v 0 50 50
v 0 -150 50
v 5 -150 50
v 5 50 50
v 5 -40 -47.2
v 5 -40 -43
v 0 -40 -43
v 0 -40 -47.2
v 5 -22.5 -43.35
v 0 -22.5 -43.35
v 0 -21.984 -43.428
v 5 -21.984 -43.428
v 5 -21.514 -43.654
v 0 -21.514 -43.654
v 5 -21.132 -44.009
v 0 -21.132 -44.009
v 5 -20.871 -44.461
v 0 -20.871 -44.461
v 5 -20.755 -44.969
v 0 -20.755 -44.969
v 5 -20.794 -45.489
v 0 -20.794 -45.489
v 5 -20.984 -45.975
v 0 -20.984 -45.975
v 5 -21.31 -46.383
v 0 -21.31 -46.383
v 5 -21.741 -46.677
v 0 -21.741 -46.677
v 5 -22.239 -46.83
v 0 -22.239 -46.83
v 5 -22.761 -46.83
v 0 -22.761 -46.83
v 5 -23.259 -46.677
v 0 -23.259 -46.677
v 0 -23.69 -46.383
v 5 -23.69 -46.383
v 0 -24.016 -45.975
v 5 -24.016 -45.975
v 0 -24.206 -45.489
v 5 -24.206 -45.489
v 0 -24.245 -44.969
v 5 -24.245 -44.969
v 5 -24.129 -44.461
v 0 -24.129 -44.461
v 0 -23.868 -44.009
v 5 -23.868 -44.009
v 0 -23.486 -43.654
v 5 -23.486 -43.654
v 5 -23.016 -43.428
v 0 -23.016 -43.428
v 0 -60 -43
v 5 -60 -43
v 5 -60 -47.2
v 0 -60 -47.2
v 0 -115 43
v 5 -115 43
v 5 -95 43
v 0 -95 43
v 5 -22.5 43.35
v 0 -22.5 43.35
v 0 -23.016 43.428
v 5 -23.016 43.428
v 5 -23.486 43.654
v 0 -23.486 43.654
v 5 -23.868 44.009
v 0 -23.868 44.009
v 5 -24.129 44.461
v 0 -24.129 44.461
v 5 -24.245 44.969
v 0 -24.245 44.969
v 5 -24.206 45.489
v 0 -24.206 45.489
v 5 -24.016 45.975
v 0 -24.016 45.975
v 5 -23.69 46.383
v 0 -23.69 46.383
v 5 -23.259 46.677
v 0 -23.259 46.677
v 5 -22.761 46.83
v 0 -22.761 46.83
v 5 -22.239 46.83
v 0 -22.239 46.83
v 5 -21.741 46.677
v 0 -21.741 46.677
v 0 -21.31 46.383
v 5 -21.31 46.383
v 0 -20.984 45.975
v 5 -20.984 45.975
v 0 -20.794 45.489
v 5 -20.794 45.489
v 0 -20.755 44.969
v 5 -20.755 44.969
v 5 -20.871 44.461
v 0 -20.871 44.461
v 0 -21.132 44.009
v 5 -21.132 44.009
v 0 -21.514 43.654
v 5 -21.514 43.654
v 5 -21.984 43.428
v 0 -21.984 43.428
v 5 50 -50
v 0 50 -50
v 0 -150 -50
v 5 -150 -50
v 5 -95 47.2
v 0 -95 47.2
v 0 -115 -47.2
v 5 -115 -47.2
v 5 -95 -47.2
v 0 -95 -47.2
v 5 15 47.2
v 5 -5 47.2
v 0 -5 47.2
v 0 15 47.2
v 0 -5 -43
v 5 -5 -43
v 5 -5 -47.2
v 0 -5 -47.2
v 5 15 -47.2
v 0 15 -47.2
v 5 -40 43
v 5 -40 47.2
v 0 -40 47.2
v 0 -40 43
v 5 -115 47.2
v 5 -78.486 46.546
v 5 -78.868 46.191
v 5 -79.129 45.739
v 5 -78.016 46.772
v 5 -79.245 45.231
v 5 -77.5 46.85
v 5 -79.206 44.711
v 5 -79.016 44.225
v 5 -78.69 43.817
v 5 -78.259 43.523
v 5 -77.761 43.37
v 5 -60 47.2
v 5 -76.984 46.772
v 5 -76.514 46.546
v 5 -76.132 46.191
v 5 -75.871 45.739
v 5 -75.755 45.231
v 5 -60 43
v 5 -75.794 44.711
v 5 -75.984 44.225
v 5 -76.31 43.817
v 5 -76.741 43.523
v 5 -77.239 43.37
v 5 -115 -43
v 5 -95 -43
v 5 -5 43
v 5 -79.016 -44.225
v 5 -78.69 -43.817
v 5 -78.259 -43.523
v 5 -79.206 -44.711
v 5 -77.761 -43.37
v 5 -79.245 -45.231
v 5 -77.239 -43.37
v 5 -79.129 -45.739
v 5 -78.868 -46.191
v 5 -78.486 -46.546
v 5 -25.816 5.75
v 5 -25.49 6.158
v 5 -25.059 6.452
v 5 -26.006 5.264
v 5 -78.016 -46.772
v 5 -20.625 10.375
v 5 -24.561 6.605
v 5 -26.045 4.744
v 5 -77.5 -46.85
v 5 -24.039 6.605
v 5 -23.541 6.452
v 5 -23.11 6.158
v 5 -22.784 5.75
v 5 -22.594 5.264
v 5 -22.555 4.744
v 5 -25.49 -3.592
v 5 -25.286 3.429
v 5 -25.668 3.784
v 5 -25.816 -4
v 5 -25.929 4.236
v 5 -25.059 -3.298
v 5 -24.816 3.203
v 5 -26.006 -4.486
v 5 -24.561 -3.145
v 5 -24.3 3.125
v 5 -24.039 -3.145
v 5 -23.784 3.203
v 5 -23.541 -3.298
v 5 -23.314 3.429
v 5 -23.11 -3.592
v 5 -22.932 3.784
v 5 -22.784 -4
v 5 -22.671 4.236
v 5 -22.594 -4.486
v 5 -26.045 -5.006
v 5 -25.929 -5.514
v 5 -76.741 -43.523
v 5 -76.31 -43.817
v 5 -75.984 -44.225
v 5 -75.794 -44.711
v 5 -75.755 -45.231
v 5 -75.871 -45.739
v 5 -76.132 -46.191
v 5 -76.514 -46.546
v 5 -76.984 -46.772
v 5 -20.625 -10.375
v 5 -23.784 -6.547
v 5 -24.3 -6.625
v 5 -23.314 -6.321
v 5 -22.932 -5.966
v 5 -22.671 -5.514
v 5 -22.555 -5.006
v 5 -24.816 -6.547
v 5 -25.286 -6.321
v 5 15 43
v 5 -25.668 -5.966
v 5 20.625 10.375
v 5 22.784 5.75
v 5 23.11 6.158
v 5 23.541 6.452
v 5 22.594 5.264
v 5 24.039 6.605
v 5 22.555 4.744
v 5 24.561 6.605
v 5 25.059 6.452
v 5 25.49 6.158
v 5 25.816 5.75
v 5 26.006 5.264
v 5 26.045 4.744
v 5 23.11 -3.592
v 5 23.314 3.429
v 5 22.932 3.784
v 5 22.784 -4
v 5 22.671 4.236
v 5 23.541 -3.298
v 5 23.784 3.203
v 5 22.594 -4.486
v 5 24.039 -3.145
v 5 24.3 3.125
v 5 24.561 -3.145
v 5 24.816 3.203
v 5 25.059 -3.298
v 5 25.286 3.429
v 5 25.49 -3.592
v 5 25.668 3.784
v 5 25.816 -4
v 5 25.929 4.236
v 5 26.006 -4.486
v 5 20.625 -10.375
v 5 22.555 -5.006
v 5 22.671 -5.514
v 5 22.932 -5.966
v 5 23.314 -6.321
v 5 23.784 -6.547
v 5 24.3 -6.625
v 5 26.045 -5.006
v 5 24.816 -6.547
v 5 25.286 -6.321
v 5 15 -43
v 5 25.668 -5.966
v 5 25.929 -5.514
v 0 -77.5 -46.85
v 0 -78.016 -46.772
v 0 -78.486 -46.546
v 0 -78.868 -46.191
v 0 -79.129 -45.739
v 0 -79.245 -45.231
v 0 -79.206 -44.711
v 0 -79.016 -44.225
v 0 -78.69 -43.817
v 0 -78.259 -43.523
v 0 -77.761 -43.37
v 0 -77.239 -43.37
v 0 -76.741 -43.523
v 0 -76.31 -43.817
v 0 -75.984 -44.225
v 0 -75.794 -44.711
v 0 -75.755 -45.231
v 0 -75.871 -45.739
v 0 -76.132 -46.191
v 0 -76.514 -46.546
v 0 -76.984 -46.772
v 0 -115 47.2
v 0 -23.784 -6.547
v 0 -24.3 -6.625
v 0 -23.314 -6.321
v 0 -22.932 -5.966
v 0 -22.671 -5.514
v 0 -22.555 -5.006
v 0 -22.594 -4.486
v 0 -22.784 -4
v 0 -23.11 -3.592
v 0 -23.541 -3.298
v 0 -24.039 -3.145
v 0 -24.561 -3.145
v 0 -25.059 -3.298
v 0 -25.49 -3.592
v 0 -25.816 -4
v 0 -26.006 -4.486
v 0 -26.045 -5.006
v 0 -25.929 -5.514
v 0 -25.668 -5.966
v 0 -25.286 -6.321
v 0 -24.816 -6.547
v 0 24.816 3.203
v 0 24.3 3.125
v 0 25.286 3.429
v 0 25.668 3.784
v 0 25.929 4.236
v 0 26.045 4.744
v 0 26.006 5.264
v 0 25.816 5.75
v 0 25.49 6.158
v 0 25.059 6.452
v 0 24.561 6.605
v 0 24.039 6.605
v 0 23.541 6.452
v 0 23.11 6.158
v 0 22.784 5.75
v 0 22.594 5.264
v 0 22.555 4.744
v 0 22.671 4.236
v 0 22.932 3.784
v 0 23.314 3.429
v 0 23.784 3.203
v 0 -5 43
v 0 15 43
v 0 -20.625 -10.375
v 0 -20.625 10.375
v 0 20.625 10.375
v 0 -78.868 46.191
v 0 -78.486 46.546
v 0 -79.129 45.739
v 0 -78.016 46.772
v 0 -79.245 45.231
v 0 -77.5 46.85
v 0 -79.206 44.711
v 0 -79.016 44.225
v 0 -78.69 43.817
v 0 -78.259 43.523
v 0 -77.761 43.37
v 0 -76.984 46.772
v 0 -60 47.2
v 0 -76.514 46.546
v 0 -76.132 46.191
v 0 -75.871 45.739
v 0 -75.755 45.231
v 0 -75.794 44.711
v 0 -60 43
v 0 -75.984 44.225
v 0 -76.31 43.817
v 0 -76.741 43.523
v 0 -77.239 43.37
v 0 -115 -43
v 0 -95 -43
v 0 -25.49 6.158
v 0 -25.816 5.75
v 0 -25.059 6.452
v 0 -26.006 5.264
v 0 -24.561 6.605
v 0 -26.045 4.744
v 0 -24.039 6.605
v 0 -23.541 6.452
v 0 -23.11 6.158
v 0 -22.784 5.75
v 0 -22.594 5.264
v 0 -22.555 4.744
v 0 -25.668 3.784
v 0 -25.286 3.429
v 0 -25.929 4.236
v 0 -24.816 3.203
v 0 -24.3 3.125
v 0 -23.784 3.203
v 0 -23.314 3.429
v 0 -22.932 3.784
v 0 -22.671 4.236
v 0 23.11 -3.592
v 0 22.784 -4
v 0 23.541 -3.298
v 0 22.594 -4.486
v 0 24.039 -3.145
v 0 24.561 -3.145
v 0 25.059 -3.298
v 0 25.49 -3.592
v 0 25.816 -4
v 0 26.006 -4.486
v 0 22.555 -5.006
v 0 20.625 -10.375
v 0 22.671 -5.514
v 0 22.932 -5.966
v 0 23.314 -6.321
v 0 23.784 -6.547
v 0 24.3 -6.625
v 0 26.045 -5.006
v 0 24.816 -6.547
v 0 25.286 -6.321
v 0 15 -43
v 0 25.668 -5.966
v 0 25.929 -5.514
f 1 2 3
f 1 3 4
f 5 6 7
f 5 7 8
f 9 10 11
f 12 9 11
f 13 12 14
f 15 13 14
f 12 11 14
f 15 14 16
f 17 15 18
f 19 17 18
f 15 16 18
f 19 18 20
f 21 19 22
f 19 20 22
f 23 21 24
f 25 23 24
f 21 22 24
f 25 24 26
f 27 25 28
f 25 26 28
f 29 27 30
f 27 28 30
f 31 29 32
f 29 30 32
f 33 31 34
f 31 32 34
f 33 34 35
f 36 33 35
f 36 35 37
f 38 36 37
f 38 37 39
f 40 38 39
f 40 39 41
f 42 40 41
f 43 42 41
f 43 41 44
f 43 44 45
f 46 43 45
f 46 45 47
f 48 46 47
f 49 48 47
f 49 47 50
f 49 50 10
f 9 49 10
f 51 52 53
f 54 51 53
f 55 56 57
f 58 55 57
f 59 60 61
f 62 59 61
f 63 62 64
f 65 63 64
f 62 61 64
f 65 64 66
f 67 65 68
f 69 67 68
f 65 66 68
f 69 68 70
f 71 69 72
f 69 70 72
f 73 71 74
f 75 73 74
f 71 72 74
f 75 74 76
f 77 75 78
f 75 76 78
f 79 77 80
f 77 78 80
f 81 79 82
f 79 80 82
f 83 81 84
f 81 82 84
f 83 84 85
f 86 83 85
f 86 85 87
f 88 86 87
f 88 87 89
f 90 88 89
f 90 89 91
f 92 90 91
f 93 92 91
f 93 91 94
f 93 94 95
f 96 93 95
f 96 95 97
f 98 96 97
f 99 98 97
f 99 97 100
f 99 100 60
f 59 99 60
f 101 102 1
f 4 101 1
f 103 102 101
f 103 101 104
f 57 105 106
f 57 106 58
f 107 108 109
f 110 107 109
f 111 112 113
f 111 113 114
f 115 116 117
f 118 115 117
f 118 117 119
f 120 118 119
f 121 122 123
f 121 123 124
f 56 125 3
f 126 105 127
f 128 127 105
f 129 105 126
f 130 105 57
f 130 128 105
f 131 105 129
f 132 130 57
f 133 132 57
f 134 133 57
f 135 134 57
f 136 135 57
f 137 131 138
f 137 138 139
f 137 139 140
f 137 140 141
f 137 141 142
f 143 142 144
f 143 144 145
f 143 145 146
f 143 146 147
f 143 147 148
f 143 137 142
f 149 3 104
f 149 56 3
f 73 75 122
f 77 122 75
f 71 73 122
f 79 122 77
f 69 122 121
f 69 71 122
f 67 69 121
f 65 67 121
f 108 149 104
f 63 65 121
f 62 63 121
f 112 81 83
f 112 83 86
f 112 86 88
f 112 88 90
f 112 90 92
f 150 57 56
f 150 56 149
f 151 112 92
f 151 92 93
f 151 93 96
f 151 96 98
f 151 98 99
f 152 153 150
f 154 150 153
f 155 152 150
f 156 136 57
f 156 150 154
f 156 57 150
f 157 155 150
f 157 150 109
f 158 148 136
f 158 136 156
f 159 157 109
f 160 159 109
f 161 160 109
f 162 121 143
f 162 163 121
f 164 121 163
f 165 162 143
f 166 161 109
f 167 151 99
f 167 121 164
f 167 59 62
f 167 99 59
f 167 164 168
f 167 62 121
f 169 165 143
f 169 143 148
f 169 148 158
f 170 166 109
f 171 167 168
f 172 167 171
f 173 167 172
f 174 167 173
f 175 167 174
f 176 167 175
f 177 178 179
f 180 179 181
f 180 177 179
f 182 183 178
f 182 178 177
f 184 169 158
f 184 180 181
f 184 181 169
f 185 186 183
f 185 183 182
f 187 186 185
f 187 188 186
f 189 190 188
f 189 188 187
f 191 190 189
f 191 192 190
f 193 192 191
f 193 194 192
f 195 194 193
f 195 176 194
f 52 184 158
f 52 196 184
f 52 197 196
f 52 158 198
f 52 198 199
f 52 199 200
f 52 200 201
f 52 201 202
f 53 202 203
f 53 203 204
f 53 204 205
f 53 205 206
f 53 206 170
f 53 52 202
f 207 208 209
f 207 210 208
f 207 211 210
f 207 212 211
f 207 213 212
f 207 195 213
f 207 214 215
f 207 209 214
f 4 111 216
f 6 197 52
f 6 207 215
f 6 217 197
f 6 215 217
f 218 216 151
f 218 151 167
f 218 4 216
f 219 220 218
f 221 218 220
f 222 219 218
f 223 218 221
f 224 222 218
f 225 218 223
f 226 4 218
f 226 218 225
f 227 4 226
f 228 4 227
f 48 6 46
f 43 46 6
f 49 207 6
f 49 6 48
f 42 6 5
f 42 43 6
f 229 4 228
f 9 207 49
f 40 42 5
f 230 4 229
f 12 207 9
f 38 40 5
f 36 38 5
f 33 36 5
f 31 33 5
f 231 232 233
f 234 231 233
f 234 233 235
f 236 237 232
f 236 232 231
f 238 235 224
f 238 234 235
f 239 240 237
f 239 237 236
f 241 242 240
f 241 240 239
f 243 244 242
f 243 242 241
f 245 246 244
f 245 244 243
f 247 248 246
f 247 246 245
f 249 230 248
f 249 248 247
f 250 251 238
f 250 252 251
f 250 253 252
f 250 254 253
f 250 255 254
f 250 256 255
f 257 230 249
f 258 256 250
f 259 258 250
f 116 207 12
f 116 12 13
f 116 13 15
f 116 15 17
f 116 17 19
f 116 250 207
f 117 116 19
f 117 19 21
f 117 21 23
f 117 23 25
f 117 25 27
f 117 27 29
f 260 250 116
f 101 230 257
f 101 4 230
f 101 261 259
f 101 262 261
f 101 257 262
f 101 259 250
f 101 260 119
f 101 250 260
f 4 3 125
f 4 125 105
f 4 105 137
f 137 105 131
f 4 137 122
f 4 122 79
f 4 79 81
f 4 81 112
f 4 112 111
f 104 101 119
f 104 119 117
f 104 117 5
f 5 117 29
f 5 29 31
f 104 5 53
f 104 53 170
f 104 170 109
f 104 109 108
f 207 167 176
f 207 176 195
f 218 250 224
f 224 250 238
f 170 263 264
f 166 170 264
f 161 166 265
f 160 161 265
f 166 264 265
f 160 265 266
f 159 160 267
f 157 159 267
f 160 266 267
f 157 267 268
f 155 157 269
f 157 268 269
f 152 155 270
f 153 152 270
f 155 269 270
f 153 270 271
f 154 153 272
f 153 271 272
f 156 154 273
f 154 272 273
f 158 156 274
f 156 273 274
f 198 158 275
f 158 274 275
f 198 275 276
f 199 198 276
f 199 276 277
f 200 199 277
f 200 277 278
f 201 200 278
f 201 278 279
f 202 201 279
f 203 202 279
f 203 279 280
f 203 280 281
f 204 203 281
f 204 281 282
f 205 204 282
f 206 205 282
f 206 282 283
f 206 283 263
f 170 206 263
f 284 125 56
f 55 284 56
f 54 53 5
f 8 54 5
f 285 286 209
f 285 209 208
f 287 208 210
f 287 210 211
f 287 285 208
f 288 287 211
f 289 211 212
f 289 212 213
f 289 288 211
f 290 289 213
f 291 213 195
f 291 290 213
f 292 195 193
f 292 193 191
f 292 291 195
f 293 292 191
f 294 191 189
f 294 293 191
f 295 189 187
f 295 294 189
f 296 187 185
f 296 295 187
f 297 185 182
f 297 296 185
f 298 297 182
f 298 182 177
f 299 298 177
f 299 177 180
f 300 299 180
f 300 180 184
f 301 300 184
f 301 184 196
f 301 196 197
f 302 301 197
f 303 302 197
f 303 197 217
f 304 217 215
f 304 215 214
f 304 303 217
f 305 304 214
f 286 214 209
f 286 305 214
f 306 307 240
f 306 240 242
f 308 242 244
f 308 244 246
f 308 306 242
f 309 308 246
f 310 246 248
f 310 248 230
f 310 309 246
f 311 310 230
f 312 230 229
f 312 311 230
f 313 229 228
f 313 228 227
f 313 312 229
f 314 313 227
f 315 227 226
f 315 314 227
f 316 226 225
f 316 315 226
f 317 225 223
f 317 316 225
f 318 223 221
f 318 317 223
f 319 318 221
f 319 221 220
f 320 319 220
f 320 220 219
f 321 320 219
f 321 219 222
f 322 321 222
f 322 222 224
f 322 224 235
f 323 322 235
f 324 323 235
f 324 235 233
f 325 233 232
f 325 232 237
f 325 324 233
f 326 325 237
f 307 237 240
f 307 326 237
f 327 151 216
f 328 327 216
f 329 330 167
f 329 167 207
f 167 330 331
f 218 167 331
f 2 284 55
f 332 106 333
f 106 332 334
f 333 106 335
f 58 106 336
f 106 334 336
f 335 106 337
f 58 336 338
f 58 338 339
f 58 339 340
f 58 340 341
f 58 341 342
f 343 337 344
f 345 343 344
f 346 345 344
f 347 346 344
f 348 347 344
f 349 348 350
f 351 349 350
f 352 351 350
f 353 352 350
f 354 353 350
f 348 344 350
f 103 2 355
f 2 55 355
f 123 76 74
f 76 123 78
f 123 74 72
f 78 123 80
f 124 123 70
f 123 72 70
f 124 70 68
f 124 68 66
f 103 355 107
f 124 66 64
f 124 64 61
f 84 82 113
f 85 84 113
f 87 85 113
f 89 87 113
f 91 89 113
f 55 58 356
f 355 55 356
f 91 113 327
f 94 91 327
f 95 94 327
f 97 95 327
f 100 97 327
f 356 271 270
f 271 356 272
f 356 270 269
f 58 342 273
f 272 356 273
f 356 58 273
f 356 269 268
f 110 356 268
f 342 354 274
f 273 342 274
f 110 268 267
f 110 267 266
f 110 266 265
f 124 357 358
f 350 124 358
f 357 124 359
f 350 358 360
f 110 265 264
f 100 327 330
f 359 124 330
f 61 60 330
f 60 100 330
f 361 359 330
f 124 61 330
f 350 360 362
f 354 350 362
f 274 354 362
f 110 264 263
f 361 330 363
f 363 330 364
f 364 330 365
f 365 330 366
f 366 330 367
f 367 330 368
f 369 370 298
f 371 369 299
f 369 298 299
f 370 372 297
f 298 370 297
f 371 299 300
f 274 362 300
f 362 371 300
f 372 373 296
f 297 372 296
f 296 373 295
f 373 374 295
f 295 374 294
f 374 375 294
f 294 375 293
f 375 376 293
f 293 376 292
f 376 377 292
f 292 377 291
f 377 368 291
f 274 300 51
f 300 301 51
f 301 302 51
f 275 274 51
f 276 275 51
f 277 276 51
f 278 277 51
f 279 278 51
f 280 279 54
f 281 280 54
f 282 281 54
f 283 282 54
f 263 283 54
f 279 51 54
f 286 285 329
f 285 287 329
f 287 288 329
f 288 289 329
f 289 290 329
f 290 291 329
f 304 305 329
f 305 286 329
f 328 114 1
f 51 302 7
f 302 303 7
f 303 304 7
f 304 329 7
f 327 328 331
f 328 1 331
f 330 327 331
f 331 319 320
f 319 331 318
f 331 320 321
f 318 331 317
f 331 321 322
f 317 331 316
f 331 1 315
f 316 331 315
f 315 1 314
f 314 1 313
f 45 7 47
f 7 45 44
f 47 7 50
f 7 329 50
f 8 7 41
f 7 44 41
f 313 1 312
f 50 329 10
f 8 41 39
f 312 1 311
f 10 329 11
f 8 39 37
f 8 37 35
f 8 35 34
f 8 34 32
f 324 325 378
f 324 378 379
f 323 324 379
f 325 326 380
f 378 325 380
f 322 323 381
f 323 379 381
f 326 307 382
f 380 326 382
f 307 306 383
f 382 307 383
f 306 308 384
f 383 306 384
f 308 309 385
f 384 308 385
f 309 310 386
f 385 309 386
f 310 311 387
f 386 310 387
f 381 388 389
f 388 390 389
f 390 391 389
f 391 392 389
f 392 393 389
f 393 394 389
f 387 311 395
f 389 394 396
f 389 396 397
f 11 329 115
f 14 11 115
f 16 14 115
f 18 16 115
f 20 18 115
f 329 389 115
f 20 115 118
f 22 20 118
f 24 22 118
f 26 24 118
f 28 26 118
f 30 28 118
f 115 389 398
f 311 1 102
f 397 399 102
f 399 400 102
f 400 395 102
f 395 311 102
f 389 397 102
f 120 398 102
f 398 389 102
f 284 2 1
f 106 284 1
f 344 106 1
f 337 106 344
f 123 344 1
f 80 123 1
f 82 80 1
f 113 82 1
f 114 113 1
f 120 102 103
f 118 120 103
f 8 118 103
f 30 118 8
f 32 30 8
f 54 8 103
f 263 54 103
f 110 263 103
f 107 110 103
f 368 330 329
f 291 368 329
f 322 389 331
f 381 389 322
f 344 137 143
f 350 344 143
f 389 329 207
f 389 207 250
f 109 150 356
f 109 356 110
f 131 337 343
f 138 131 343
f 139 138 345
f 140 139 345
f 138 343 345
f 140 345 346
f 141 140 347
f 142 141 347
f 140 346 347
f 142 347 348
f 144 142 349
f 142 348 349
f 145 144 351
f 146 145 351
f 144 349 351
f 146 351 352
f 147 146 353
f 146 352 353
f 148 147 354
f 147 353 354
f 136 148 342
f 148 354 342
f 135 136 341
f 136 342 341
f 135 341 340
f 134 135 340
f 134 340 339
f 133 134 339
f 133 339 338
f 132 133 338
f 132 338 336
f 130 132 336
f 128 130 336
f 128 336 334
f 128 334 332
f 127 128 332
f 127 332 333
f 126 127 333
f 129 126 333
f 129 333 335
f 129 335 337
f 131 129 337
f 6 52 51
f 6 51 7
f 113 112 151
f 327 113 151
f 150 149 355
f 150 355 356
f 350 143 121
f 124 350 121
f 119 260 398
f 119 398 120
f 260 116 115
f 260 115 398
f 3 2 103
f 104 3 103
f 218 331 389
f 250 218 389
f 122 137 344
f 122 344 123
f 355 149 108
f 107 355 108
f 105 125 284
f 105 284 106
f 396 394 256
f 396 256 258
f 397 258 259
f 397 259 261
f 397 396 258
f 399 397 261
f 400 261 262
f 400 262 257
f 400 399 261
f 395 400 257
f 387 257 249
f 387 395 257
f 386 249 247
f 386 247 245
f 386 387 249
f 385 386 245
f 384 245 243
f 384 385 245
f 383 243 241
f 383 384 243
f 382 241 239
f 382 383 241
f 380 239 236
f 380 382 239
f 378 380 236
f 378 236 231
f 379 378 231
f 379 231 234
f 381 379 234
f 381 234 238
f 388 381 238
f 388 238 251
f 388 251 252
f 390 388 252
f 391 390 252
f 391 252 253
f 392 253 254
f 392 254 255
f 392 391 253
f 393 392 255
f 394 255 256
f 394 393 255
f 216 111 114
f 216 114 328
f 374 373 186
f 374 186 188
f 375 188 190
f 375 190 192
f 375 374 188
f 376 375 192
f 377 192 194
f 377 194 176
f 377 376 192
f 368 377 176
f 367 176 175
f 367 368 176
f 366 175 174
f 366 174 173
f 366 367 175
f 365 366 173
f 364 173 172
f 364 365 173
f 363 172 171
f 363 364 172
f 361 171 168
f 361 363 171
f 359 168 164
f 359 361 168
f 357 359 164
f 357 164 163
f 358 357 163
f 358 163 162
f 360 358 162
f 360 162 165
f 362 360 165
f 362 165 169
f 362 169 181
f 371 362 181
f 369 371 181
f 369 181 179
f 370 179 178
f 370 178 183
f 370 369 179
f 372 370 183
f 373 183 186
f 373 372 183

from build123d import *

# Parameters (mm, degrees)
CUT_EXTRUDE1_START     = -5
CUT_EXTRUDE1_OUTLINE_R = 1.75
CUT_EXTRUDE1_OUTLINE_W = 20.75
CUT_EXTRUDE1_OUTLINE_H = 41.25
CUT_EXTRUDE1_DEPTH     = 5
BOSS_EXTRUDE1_START    = -5
BOSS_EXTRUDE1_DEPTH    = 5
SKETCH4_W              = 30
SKETCH4_H              = 60
BOSS_EXTRUDE2_DEPTH    = 5
CUT_EXTRUDE2_REACH     = 160.193
SKETCH5_W              = 4.2
SKETCH5_H              = 20
CUT_EXTRUDE3_REACH     = 160.193
SKETCH6_R              = 1.75


with BuildPart() as part:
    # Cut-Extrude1: read off the stored shape, not the designer's step
    # Cut-Extrude1 outline → Cut-Extrude1 (new body)
    with BuildSketch(Plane(origin=(5, 0, 0), x_dir=(0, 0, -1), z_dir=(1, 0, 0)).offset(CUT_EXTRUDE1_START)):
        with BuildLine():
            Line((-6.17, -30), (6.17, -30))
            ThreePointArc((6.17, -30), (12.413752878, -27.413752878), (15, -21.17))
            Line((15, -21.17), (15, 21.17))
            ThreePointArc((15, 21.17), (12.413752878, 27.413752878), (6.17, 30))
            Line((6.17, 30), (-6.17, 30))
            ThreePointArc((-6.17, 30), (-12.413752878, 27.413752878), (-15, 21.17))
            Line((-15, 21.17), (-15, -21.17))
            ThreePointArc((-15, -21.17), (-12.413752878, -27.413752878), (-6.17, -30))
        make_face()
        with Locations((-4.875, -24.3)):
            Circle(CUT_EXTRUDE1_OUTLINE_R, mode=Mode.SUBTRACT)
        with Locations((4.875, -24.3)):
            Circle(CUT_EXTRUDE1_OUTLINE_R, mode=Mode.SUBTRACT)
        with Locations((-4.875, 24.3)):
            Circle(CUT_EXTRUDE1_OUTLINE_R, mode=Mode.SUBTRACT)
        Rectangle(CUT_EXTRUDE1_OUTLINE_W, CUT_EXTRUDE1_OUTLINE_H, mode=Mode.SUBTRACT)
        with Locations((4.875, 24.3)):
            Circle(CUT_EXTRUDE1_OUTLINE_R, mode=Mode.SUBTRACT)
    extrude(amount=CUT_EXTRUDE1_DEPTH)

    # Sketch2 → Boss-Extrude1 (add)
    with BuildSketch(Plane(origin=(5, 0, 0), x_dir=(0, 0, -1), z_dir=(1, 0, 0)).offset(BOSS_EXTRUDE1_START)):
        with BuildLine():
            Line((10.375, -20.625), (6.17, -20.625))
            Line((6.17, -20.625), (6.17, -21.93080825))
            Line((6.17, -21.93080825), (7.268440243, -21.93080825))
            Line((7.268440243, -21.93080825), (7.268440243, -27.341819789))
            Line((7.268440243, -27.341819789), (6.17, -27.341819789))
            Line((6.17, -27.341819789), (6.17, -30))
            ThreePointArc((6.17, -30), (12.413752878, -27.413752878), (15, -21.17))
            Line((15, -21.17), (15, 21.17))
            ThreePointArc((15, 21.17), (12.413752878, 27.413752878), (6.17, 30))
            Line((6.17, 30), (6.17, 26.982507006))
            Line((6.17, 26.982507006), (7.710578553, 26.982507006))
            Line((7.710578553, 26.982507006), (7.710578553, 21.584637872))
            Line((7.710578553, 21.584637872), (6.17, 21.584637872))
            Line((6.17, 21.584637872), (6.17, 20.625))
            Line((6.17, 20.625), (10.375, 20.625))
            Line((10.375, 20.625), (10.375, -20.625))
        make_face()
        with BuildLine():
            Line((-8.472684232, -21.93080825), (-6.17, -21.93080825))
            Line((-6.17, -21.93080825), (-6.17, -20.625))
            Line((-6.17, -20.625), (-10.375, -20.625))
            Line((-10.375, -20.625), (-10.375, 20.625))
            Line((-10.375, 20.625), (-6.17, 20.625))
            Line((-6.17, 20.625), (-6.17, 21.584637872))
            Line((-6.17, 21.584637872), (-7.710578553, 21.584637872))
            Line((-7.710578553, 21.584637872), (-7.710578553, 26.982507006))
            Line((-7.710578553, 26.982507006), (-6.17, 26.982507006))
            Line((-6.17, 26.982507006), (-6.17, 30))
            ThreePointArc((-6.17, 30), (-12.413752878, 27.413752878), (-15, 21.17))
            Line((-15, 21.17), (-15, -21.17))
            ThreePointArc((-15, -21.17), (-12.413752878, -27.413752878), (-6.17, -30))
            Line((-6.17, -30), (-6.17, -27.341819789))
            Line((-6.17, -27.341819789), (-8.472684232, -27.341819789))
            Line((-8.472684232, -27.341819789), (-8.472684232, -21.93080825))
        make_face()
        with BuildLine():
            Line((-15, 30), (-15, 21.17))
            ThreePointArc((-15, 21.17), (-12.413752878, 27.413752878), (-6.17, 30))
            Line((-6.17, 30), (-15, 30))
        make_face()
        with BuildLine():
            Line((15, 30), (6.17, 30))
            ThreePointArc((6.17, 30), (12.413752878, 27.413752878), (15, 21.17))
            Line((15, 21.17), (15, 30))
        make_face()
        with BuildLine():
            ThreePointArc((15, -21.17), (12.413752878, -27.413752878), (6.17, -30))
            Line((6.17, -30), (15, -30))
            Line((15, -30), (15, -21.17))
        make_face()
        with BuildLine():
            Line((-15, -30), (-6.17, -30))
            ThreePointArc((-6.17, -30), (-12.413752878, -27.413752878), (-15, -21.17))
            Line((-15, -21.17), (-15, -30))
        make_face()
    extrude(amount=BOSS_EXTRUDE1_DEPTH)

    # Sketch4 → Boss-Extrude2 (add)
    with BuildSketch(Plane.ZY):
        Polygon((-50, 50), (50, 50), (50, -50), (50, -150), (-50, -150), (-50, -50), align=None)
        Rectangle(SKETCH4_W, SKETCH4_H, mode=Mode.SUBTRACT)
    extrude(amount=-BOSS_EXTRUDE2_DEPTH)

    # Sketch5 → Cut-Extrude2 (cut, up to next)
    with BuildSketch(Plane(origin=(5, 0, 0), x_dir=(0, 0, -1), z_dir=(1, 0, 0)), mode=Mode.PRIVATE) as cut_extrude2_sk1:
        with Locations((45.1, -105)):
            Rectangle(SKETCH5_W, SKETCH5_H)
    cut_extrude2_tool1 = extrude(cut_extrude2_sk1.sketch, amount=-CUT_EXTRUDE2_REACH, mode=Mode.PRIVATE) & part.part
    # Sketch5 → Cut-Extrude2 (cut, up to next)
    with BuildSketch(Plane(origin=(5, 0, 0), x_dir=(0, 0, -1), z_dir=(1, 0, 0)), mode=Mode.PRIVATE) as cut_extrude2_sk2:
        with Locations((45.1, -50)):
            Rectangle(SKETCH5_W, SKETCH5_H)
    cut_extrude2_tool2 = extrude(cut_extrude2_sk2.sketch, amount=-CUT_EXTRUDE2_REACH, mode=Mode.PRIVATE) & part.part
    # Sketch5 → Cut-Extrude2 (cut, up to next)
    with BuildSketch(Plane(origin=(5, 0, 0), x_dir=(0, 0, -1), z_dir=(1, 0, 0)), mode=Mode.PRIVATE) as cut_extrude2_sk3:
        with Locations((45.1, 5)):
            Rectangle(SKETCH5_W, SKETCH5_H)
    cut_extrude2_tool3 = extrude(cut_extrude2_sk3.sketch, amount=-CUT_EXTRUDE2_REACH, mode=Mode.PRIVATE) & part.part
    # Sketch5 → Cut-Extrude2 (cut, up to next)
    with BuildSketch(Plane(origin=(5, 0, 0), x_dir=(0, 0, -1), z_dir=(1, 0, 0)), mode=Mode.PRIVATE) as cut_extrude2_sk4:
        with Locations((-45.1, 5)):
            Rectangle(SKETCH5_W, SKETCH5_H)
    cut_extrude2_tool4 = extrude(cut_extrude2_sk4.sketch, amount=-CUT_EXTRUDE2_REACH, mode=Mode.PRIVATE) & part.part
    # Sketch5 → Cut-Extrude2 (cut, up to next)
    with BuildSketch(Plane(origin=(5, 0, 0), x_dir=(0, 0, -1), z_dir=(1, 0, 0)), mode=Mode.PRIVATE) as cut_extrude2_sk5:
        with Locations((-45.1, -50)):
            Rectangle(SKETCH5_W, SKETCH5_H)
    cut_extrude2_tool5 = extrude(cut_extrude2_sk5.sketch, amount=-CUT_EXTRUDE2_REACH, mode=Mode.PRIVATE) & part.part
    # Sketch5 → Cut-Extrude2 (cut, up to next)
    with BuildSketch(Plane(origin=(5, 0, 0), x_dir=(0, 0, -1), z_dir=(1, 0, 0)), mode=Mode.PRIVATE) as cut_extrude2_sk6:
        with Locations((-45.1, -105)):
            Rectangle(SKETCH5_W, SKETCH5_H)
    cut_extrude2_tool6 = extrude(cut_extrude2_sk6.sketch, amount=-CUT_EXTRUDE2_REACH, mode=Mode.PRIVATE) & part.part
    add(cut_extrude2_tool1.solids().sort_by_distance((5, -105, -45.1))[0], mode=Mode.SUBTRACT)
    add(cut_extrude2_tool2.solids().sort_by_distance((5, -50, -45.1))[0], mode=Mode.SUBTRACT)
    add(cut_extrude2_tool3.solids().sort_by_distance((5, 5, -45.1))[0], mode=Mode.SUBTRACT)
    add(cut_extrude2_tool4.solids().sort_by_distance((5, 5, 45.1))[0], mode=Mode.SUBTRACT)
    add(cut_extrude2_tool5.solids().sort_by_distance((5, -50, 45.1))[0], mode=Mode.SUBTRACT)
    add(cut_extrude2_tool6.solids().sort_by_distance((5, -105, 45.1))[0], mode=Mode.SUBTRACT)

    # Sketch6 → Cut-Extrude3 (cut, up to next)
    with BuildSketch(Plane.ZY, mode=Mode.PRIVATE) as cut_extrude3_sk1:
        with Locations((45.1, -77.5)):
            Circle(SKETCH6_R)
    cut_extrude3_tool1 = extrude(cut_extrude3_sk1.sketch, amount=-CUT_EXTRUDE3_REACH, mode=Mode.PRIVATE) & part.part
    # Sketch6 → Cut-Extrude3 (cut, up to next)
    with BuildSketch(Plane.ZY, mode=Mode.PRIVATE) as cut_extrude3_sk2:
        with Locations(Location((-45.1, -77.5, 0), (0, 0, 180))):
            Circle(SKETCH6_R)
    cut_extrude3_tool2 = extrude(cut_extrude3_sk2.sketch, amount=-CUT_EXTRUDE3_REACH, mode=Mode.PRIVATE) & part.part
    # Sketch6 → Cut-Extrude3 (cut, up to next)
    with BuildSketch(Plane.ZY, mode=Mode.PRIVATE) as cut_extrude3_sk3:
        with Locations((-45.1, -22.5)):
            Circle(SKETCH6_R)
    cut_extrude3_tool3 = extrude(cut_extrude3_sk3.sketch, amount=-CUT_EXTRUDE3_REACH, mode=Mode.PRIVATE) & part.part
    # Sketch6 → Cut-Extrude3 (cut, up to next)
    with BuildSketch(Plane.ZY, mode=Mode.PRIVATE) as cut_extrude3_sk4:
        with Locations(Location((45.1, -22.5, 0), (0, 0, 180))):
            Circle(SKETCH6_R)
    cut_extrude3_tool4 = extrude(cut_extrude3_sk4.sketch, amount=-CUT_EXTRUDE3_REACH, mode=Mode.PRIVATE) & part.part
    add(cut_extrude3_tool1.solids().sort_by_distance((0, -77.5, 45.1))[0], mode=Mode.SUBTRACT)
    add(cut_extrude3_tool2.solids().sort_by_distance((0, -77.5, -45.1))[0], mode=Mode.SUBTRACT)
    add(cut_extrude3_tool3.solids().sort_by_distance((0, -22.5, -45.1))[0], mode=Mode.SUBTRACT)
    add(cut_extrude3_tool4.solids().sort_by_distance((0, -22.5, 45.1))[0], mode=Mode.SUBTRACT)


solid = part.part
